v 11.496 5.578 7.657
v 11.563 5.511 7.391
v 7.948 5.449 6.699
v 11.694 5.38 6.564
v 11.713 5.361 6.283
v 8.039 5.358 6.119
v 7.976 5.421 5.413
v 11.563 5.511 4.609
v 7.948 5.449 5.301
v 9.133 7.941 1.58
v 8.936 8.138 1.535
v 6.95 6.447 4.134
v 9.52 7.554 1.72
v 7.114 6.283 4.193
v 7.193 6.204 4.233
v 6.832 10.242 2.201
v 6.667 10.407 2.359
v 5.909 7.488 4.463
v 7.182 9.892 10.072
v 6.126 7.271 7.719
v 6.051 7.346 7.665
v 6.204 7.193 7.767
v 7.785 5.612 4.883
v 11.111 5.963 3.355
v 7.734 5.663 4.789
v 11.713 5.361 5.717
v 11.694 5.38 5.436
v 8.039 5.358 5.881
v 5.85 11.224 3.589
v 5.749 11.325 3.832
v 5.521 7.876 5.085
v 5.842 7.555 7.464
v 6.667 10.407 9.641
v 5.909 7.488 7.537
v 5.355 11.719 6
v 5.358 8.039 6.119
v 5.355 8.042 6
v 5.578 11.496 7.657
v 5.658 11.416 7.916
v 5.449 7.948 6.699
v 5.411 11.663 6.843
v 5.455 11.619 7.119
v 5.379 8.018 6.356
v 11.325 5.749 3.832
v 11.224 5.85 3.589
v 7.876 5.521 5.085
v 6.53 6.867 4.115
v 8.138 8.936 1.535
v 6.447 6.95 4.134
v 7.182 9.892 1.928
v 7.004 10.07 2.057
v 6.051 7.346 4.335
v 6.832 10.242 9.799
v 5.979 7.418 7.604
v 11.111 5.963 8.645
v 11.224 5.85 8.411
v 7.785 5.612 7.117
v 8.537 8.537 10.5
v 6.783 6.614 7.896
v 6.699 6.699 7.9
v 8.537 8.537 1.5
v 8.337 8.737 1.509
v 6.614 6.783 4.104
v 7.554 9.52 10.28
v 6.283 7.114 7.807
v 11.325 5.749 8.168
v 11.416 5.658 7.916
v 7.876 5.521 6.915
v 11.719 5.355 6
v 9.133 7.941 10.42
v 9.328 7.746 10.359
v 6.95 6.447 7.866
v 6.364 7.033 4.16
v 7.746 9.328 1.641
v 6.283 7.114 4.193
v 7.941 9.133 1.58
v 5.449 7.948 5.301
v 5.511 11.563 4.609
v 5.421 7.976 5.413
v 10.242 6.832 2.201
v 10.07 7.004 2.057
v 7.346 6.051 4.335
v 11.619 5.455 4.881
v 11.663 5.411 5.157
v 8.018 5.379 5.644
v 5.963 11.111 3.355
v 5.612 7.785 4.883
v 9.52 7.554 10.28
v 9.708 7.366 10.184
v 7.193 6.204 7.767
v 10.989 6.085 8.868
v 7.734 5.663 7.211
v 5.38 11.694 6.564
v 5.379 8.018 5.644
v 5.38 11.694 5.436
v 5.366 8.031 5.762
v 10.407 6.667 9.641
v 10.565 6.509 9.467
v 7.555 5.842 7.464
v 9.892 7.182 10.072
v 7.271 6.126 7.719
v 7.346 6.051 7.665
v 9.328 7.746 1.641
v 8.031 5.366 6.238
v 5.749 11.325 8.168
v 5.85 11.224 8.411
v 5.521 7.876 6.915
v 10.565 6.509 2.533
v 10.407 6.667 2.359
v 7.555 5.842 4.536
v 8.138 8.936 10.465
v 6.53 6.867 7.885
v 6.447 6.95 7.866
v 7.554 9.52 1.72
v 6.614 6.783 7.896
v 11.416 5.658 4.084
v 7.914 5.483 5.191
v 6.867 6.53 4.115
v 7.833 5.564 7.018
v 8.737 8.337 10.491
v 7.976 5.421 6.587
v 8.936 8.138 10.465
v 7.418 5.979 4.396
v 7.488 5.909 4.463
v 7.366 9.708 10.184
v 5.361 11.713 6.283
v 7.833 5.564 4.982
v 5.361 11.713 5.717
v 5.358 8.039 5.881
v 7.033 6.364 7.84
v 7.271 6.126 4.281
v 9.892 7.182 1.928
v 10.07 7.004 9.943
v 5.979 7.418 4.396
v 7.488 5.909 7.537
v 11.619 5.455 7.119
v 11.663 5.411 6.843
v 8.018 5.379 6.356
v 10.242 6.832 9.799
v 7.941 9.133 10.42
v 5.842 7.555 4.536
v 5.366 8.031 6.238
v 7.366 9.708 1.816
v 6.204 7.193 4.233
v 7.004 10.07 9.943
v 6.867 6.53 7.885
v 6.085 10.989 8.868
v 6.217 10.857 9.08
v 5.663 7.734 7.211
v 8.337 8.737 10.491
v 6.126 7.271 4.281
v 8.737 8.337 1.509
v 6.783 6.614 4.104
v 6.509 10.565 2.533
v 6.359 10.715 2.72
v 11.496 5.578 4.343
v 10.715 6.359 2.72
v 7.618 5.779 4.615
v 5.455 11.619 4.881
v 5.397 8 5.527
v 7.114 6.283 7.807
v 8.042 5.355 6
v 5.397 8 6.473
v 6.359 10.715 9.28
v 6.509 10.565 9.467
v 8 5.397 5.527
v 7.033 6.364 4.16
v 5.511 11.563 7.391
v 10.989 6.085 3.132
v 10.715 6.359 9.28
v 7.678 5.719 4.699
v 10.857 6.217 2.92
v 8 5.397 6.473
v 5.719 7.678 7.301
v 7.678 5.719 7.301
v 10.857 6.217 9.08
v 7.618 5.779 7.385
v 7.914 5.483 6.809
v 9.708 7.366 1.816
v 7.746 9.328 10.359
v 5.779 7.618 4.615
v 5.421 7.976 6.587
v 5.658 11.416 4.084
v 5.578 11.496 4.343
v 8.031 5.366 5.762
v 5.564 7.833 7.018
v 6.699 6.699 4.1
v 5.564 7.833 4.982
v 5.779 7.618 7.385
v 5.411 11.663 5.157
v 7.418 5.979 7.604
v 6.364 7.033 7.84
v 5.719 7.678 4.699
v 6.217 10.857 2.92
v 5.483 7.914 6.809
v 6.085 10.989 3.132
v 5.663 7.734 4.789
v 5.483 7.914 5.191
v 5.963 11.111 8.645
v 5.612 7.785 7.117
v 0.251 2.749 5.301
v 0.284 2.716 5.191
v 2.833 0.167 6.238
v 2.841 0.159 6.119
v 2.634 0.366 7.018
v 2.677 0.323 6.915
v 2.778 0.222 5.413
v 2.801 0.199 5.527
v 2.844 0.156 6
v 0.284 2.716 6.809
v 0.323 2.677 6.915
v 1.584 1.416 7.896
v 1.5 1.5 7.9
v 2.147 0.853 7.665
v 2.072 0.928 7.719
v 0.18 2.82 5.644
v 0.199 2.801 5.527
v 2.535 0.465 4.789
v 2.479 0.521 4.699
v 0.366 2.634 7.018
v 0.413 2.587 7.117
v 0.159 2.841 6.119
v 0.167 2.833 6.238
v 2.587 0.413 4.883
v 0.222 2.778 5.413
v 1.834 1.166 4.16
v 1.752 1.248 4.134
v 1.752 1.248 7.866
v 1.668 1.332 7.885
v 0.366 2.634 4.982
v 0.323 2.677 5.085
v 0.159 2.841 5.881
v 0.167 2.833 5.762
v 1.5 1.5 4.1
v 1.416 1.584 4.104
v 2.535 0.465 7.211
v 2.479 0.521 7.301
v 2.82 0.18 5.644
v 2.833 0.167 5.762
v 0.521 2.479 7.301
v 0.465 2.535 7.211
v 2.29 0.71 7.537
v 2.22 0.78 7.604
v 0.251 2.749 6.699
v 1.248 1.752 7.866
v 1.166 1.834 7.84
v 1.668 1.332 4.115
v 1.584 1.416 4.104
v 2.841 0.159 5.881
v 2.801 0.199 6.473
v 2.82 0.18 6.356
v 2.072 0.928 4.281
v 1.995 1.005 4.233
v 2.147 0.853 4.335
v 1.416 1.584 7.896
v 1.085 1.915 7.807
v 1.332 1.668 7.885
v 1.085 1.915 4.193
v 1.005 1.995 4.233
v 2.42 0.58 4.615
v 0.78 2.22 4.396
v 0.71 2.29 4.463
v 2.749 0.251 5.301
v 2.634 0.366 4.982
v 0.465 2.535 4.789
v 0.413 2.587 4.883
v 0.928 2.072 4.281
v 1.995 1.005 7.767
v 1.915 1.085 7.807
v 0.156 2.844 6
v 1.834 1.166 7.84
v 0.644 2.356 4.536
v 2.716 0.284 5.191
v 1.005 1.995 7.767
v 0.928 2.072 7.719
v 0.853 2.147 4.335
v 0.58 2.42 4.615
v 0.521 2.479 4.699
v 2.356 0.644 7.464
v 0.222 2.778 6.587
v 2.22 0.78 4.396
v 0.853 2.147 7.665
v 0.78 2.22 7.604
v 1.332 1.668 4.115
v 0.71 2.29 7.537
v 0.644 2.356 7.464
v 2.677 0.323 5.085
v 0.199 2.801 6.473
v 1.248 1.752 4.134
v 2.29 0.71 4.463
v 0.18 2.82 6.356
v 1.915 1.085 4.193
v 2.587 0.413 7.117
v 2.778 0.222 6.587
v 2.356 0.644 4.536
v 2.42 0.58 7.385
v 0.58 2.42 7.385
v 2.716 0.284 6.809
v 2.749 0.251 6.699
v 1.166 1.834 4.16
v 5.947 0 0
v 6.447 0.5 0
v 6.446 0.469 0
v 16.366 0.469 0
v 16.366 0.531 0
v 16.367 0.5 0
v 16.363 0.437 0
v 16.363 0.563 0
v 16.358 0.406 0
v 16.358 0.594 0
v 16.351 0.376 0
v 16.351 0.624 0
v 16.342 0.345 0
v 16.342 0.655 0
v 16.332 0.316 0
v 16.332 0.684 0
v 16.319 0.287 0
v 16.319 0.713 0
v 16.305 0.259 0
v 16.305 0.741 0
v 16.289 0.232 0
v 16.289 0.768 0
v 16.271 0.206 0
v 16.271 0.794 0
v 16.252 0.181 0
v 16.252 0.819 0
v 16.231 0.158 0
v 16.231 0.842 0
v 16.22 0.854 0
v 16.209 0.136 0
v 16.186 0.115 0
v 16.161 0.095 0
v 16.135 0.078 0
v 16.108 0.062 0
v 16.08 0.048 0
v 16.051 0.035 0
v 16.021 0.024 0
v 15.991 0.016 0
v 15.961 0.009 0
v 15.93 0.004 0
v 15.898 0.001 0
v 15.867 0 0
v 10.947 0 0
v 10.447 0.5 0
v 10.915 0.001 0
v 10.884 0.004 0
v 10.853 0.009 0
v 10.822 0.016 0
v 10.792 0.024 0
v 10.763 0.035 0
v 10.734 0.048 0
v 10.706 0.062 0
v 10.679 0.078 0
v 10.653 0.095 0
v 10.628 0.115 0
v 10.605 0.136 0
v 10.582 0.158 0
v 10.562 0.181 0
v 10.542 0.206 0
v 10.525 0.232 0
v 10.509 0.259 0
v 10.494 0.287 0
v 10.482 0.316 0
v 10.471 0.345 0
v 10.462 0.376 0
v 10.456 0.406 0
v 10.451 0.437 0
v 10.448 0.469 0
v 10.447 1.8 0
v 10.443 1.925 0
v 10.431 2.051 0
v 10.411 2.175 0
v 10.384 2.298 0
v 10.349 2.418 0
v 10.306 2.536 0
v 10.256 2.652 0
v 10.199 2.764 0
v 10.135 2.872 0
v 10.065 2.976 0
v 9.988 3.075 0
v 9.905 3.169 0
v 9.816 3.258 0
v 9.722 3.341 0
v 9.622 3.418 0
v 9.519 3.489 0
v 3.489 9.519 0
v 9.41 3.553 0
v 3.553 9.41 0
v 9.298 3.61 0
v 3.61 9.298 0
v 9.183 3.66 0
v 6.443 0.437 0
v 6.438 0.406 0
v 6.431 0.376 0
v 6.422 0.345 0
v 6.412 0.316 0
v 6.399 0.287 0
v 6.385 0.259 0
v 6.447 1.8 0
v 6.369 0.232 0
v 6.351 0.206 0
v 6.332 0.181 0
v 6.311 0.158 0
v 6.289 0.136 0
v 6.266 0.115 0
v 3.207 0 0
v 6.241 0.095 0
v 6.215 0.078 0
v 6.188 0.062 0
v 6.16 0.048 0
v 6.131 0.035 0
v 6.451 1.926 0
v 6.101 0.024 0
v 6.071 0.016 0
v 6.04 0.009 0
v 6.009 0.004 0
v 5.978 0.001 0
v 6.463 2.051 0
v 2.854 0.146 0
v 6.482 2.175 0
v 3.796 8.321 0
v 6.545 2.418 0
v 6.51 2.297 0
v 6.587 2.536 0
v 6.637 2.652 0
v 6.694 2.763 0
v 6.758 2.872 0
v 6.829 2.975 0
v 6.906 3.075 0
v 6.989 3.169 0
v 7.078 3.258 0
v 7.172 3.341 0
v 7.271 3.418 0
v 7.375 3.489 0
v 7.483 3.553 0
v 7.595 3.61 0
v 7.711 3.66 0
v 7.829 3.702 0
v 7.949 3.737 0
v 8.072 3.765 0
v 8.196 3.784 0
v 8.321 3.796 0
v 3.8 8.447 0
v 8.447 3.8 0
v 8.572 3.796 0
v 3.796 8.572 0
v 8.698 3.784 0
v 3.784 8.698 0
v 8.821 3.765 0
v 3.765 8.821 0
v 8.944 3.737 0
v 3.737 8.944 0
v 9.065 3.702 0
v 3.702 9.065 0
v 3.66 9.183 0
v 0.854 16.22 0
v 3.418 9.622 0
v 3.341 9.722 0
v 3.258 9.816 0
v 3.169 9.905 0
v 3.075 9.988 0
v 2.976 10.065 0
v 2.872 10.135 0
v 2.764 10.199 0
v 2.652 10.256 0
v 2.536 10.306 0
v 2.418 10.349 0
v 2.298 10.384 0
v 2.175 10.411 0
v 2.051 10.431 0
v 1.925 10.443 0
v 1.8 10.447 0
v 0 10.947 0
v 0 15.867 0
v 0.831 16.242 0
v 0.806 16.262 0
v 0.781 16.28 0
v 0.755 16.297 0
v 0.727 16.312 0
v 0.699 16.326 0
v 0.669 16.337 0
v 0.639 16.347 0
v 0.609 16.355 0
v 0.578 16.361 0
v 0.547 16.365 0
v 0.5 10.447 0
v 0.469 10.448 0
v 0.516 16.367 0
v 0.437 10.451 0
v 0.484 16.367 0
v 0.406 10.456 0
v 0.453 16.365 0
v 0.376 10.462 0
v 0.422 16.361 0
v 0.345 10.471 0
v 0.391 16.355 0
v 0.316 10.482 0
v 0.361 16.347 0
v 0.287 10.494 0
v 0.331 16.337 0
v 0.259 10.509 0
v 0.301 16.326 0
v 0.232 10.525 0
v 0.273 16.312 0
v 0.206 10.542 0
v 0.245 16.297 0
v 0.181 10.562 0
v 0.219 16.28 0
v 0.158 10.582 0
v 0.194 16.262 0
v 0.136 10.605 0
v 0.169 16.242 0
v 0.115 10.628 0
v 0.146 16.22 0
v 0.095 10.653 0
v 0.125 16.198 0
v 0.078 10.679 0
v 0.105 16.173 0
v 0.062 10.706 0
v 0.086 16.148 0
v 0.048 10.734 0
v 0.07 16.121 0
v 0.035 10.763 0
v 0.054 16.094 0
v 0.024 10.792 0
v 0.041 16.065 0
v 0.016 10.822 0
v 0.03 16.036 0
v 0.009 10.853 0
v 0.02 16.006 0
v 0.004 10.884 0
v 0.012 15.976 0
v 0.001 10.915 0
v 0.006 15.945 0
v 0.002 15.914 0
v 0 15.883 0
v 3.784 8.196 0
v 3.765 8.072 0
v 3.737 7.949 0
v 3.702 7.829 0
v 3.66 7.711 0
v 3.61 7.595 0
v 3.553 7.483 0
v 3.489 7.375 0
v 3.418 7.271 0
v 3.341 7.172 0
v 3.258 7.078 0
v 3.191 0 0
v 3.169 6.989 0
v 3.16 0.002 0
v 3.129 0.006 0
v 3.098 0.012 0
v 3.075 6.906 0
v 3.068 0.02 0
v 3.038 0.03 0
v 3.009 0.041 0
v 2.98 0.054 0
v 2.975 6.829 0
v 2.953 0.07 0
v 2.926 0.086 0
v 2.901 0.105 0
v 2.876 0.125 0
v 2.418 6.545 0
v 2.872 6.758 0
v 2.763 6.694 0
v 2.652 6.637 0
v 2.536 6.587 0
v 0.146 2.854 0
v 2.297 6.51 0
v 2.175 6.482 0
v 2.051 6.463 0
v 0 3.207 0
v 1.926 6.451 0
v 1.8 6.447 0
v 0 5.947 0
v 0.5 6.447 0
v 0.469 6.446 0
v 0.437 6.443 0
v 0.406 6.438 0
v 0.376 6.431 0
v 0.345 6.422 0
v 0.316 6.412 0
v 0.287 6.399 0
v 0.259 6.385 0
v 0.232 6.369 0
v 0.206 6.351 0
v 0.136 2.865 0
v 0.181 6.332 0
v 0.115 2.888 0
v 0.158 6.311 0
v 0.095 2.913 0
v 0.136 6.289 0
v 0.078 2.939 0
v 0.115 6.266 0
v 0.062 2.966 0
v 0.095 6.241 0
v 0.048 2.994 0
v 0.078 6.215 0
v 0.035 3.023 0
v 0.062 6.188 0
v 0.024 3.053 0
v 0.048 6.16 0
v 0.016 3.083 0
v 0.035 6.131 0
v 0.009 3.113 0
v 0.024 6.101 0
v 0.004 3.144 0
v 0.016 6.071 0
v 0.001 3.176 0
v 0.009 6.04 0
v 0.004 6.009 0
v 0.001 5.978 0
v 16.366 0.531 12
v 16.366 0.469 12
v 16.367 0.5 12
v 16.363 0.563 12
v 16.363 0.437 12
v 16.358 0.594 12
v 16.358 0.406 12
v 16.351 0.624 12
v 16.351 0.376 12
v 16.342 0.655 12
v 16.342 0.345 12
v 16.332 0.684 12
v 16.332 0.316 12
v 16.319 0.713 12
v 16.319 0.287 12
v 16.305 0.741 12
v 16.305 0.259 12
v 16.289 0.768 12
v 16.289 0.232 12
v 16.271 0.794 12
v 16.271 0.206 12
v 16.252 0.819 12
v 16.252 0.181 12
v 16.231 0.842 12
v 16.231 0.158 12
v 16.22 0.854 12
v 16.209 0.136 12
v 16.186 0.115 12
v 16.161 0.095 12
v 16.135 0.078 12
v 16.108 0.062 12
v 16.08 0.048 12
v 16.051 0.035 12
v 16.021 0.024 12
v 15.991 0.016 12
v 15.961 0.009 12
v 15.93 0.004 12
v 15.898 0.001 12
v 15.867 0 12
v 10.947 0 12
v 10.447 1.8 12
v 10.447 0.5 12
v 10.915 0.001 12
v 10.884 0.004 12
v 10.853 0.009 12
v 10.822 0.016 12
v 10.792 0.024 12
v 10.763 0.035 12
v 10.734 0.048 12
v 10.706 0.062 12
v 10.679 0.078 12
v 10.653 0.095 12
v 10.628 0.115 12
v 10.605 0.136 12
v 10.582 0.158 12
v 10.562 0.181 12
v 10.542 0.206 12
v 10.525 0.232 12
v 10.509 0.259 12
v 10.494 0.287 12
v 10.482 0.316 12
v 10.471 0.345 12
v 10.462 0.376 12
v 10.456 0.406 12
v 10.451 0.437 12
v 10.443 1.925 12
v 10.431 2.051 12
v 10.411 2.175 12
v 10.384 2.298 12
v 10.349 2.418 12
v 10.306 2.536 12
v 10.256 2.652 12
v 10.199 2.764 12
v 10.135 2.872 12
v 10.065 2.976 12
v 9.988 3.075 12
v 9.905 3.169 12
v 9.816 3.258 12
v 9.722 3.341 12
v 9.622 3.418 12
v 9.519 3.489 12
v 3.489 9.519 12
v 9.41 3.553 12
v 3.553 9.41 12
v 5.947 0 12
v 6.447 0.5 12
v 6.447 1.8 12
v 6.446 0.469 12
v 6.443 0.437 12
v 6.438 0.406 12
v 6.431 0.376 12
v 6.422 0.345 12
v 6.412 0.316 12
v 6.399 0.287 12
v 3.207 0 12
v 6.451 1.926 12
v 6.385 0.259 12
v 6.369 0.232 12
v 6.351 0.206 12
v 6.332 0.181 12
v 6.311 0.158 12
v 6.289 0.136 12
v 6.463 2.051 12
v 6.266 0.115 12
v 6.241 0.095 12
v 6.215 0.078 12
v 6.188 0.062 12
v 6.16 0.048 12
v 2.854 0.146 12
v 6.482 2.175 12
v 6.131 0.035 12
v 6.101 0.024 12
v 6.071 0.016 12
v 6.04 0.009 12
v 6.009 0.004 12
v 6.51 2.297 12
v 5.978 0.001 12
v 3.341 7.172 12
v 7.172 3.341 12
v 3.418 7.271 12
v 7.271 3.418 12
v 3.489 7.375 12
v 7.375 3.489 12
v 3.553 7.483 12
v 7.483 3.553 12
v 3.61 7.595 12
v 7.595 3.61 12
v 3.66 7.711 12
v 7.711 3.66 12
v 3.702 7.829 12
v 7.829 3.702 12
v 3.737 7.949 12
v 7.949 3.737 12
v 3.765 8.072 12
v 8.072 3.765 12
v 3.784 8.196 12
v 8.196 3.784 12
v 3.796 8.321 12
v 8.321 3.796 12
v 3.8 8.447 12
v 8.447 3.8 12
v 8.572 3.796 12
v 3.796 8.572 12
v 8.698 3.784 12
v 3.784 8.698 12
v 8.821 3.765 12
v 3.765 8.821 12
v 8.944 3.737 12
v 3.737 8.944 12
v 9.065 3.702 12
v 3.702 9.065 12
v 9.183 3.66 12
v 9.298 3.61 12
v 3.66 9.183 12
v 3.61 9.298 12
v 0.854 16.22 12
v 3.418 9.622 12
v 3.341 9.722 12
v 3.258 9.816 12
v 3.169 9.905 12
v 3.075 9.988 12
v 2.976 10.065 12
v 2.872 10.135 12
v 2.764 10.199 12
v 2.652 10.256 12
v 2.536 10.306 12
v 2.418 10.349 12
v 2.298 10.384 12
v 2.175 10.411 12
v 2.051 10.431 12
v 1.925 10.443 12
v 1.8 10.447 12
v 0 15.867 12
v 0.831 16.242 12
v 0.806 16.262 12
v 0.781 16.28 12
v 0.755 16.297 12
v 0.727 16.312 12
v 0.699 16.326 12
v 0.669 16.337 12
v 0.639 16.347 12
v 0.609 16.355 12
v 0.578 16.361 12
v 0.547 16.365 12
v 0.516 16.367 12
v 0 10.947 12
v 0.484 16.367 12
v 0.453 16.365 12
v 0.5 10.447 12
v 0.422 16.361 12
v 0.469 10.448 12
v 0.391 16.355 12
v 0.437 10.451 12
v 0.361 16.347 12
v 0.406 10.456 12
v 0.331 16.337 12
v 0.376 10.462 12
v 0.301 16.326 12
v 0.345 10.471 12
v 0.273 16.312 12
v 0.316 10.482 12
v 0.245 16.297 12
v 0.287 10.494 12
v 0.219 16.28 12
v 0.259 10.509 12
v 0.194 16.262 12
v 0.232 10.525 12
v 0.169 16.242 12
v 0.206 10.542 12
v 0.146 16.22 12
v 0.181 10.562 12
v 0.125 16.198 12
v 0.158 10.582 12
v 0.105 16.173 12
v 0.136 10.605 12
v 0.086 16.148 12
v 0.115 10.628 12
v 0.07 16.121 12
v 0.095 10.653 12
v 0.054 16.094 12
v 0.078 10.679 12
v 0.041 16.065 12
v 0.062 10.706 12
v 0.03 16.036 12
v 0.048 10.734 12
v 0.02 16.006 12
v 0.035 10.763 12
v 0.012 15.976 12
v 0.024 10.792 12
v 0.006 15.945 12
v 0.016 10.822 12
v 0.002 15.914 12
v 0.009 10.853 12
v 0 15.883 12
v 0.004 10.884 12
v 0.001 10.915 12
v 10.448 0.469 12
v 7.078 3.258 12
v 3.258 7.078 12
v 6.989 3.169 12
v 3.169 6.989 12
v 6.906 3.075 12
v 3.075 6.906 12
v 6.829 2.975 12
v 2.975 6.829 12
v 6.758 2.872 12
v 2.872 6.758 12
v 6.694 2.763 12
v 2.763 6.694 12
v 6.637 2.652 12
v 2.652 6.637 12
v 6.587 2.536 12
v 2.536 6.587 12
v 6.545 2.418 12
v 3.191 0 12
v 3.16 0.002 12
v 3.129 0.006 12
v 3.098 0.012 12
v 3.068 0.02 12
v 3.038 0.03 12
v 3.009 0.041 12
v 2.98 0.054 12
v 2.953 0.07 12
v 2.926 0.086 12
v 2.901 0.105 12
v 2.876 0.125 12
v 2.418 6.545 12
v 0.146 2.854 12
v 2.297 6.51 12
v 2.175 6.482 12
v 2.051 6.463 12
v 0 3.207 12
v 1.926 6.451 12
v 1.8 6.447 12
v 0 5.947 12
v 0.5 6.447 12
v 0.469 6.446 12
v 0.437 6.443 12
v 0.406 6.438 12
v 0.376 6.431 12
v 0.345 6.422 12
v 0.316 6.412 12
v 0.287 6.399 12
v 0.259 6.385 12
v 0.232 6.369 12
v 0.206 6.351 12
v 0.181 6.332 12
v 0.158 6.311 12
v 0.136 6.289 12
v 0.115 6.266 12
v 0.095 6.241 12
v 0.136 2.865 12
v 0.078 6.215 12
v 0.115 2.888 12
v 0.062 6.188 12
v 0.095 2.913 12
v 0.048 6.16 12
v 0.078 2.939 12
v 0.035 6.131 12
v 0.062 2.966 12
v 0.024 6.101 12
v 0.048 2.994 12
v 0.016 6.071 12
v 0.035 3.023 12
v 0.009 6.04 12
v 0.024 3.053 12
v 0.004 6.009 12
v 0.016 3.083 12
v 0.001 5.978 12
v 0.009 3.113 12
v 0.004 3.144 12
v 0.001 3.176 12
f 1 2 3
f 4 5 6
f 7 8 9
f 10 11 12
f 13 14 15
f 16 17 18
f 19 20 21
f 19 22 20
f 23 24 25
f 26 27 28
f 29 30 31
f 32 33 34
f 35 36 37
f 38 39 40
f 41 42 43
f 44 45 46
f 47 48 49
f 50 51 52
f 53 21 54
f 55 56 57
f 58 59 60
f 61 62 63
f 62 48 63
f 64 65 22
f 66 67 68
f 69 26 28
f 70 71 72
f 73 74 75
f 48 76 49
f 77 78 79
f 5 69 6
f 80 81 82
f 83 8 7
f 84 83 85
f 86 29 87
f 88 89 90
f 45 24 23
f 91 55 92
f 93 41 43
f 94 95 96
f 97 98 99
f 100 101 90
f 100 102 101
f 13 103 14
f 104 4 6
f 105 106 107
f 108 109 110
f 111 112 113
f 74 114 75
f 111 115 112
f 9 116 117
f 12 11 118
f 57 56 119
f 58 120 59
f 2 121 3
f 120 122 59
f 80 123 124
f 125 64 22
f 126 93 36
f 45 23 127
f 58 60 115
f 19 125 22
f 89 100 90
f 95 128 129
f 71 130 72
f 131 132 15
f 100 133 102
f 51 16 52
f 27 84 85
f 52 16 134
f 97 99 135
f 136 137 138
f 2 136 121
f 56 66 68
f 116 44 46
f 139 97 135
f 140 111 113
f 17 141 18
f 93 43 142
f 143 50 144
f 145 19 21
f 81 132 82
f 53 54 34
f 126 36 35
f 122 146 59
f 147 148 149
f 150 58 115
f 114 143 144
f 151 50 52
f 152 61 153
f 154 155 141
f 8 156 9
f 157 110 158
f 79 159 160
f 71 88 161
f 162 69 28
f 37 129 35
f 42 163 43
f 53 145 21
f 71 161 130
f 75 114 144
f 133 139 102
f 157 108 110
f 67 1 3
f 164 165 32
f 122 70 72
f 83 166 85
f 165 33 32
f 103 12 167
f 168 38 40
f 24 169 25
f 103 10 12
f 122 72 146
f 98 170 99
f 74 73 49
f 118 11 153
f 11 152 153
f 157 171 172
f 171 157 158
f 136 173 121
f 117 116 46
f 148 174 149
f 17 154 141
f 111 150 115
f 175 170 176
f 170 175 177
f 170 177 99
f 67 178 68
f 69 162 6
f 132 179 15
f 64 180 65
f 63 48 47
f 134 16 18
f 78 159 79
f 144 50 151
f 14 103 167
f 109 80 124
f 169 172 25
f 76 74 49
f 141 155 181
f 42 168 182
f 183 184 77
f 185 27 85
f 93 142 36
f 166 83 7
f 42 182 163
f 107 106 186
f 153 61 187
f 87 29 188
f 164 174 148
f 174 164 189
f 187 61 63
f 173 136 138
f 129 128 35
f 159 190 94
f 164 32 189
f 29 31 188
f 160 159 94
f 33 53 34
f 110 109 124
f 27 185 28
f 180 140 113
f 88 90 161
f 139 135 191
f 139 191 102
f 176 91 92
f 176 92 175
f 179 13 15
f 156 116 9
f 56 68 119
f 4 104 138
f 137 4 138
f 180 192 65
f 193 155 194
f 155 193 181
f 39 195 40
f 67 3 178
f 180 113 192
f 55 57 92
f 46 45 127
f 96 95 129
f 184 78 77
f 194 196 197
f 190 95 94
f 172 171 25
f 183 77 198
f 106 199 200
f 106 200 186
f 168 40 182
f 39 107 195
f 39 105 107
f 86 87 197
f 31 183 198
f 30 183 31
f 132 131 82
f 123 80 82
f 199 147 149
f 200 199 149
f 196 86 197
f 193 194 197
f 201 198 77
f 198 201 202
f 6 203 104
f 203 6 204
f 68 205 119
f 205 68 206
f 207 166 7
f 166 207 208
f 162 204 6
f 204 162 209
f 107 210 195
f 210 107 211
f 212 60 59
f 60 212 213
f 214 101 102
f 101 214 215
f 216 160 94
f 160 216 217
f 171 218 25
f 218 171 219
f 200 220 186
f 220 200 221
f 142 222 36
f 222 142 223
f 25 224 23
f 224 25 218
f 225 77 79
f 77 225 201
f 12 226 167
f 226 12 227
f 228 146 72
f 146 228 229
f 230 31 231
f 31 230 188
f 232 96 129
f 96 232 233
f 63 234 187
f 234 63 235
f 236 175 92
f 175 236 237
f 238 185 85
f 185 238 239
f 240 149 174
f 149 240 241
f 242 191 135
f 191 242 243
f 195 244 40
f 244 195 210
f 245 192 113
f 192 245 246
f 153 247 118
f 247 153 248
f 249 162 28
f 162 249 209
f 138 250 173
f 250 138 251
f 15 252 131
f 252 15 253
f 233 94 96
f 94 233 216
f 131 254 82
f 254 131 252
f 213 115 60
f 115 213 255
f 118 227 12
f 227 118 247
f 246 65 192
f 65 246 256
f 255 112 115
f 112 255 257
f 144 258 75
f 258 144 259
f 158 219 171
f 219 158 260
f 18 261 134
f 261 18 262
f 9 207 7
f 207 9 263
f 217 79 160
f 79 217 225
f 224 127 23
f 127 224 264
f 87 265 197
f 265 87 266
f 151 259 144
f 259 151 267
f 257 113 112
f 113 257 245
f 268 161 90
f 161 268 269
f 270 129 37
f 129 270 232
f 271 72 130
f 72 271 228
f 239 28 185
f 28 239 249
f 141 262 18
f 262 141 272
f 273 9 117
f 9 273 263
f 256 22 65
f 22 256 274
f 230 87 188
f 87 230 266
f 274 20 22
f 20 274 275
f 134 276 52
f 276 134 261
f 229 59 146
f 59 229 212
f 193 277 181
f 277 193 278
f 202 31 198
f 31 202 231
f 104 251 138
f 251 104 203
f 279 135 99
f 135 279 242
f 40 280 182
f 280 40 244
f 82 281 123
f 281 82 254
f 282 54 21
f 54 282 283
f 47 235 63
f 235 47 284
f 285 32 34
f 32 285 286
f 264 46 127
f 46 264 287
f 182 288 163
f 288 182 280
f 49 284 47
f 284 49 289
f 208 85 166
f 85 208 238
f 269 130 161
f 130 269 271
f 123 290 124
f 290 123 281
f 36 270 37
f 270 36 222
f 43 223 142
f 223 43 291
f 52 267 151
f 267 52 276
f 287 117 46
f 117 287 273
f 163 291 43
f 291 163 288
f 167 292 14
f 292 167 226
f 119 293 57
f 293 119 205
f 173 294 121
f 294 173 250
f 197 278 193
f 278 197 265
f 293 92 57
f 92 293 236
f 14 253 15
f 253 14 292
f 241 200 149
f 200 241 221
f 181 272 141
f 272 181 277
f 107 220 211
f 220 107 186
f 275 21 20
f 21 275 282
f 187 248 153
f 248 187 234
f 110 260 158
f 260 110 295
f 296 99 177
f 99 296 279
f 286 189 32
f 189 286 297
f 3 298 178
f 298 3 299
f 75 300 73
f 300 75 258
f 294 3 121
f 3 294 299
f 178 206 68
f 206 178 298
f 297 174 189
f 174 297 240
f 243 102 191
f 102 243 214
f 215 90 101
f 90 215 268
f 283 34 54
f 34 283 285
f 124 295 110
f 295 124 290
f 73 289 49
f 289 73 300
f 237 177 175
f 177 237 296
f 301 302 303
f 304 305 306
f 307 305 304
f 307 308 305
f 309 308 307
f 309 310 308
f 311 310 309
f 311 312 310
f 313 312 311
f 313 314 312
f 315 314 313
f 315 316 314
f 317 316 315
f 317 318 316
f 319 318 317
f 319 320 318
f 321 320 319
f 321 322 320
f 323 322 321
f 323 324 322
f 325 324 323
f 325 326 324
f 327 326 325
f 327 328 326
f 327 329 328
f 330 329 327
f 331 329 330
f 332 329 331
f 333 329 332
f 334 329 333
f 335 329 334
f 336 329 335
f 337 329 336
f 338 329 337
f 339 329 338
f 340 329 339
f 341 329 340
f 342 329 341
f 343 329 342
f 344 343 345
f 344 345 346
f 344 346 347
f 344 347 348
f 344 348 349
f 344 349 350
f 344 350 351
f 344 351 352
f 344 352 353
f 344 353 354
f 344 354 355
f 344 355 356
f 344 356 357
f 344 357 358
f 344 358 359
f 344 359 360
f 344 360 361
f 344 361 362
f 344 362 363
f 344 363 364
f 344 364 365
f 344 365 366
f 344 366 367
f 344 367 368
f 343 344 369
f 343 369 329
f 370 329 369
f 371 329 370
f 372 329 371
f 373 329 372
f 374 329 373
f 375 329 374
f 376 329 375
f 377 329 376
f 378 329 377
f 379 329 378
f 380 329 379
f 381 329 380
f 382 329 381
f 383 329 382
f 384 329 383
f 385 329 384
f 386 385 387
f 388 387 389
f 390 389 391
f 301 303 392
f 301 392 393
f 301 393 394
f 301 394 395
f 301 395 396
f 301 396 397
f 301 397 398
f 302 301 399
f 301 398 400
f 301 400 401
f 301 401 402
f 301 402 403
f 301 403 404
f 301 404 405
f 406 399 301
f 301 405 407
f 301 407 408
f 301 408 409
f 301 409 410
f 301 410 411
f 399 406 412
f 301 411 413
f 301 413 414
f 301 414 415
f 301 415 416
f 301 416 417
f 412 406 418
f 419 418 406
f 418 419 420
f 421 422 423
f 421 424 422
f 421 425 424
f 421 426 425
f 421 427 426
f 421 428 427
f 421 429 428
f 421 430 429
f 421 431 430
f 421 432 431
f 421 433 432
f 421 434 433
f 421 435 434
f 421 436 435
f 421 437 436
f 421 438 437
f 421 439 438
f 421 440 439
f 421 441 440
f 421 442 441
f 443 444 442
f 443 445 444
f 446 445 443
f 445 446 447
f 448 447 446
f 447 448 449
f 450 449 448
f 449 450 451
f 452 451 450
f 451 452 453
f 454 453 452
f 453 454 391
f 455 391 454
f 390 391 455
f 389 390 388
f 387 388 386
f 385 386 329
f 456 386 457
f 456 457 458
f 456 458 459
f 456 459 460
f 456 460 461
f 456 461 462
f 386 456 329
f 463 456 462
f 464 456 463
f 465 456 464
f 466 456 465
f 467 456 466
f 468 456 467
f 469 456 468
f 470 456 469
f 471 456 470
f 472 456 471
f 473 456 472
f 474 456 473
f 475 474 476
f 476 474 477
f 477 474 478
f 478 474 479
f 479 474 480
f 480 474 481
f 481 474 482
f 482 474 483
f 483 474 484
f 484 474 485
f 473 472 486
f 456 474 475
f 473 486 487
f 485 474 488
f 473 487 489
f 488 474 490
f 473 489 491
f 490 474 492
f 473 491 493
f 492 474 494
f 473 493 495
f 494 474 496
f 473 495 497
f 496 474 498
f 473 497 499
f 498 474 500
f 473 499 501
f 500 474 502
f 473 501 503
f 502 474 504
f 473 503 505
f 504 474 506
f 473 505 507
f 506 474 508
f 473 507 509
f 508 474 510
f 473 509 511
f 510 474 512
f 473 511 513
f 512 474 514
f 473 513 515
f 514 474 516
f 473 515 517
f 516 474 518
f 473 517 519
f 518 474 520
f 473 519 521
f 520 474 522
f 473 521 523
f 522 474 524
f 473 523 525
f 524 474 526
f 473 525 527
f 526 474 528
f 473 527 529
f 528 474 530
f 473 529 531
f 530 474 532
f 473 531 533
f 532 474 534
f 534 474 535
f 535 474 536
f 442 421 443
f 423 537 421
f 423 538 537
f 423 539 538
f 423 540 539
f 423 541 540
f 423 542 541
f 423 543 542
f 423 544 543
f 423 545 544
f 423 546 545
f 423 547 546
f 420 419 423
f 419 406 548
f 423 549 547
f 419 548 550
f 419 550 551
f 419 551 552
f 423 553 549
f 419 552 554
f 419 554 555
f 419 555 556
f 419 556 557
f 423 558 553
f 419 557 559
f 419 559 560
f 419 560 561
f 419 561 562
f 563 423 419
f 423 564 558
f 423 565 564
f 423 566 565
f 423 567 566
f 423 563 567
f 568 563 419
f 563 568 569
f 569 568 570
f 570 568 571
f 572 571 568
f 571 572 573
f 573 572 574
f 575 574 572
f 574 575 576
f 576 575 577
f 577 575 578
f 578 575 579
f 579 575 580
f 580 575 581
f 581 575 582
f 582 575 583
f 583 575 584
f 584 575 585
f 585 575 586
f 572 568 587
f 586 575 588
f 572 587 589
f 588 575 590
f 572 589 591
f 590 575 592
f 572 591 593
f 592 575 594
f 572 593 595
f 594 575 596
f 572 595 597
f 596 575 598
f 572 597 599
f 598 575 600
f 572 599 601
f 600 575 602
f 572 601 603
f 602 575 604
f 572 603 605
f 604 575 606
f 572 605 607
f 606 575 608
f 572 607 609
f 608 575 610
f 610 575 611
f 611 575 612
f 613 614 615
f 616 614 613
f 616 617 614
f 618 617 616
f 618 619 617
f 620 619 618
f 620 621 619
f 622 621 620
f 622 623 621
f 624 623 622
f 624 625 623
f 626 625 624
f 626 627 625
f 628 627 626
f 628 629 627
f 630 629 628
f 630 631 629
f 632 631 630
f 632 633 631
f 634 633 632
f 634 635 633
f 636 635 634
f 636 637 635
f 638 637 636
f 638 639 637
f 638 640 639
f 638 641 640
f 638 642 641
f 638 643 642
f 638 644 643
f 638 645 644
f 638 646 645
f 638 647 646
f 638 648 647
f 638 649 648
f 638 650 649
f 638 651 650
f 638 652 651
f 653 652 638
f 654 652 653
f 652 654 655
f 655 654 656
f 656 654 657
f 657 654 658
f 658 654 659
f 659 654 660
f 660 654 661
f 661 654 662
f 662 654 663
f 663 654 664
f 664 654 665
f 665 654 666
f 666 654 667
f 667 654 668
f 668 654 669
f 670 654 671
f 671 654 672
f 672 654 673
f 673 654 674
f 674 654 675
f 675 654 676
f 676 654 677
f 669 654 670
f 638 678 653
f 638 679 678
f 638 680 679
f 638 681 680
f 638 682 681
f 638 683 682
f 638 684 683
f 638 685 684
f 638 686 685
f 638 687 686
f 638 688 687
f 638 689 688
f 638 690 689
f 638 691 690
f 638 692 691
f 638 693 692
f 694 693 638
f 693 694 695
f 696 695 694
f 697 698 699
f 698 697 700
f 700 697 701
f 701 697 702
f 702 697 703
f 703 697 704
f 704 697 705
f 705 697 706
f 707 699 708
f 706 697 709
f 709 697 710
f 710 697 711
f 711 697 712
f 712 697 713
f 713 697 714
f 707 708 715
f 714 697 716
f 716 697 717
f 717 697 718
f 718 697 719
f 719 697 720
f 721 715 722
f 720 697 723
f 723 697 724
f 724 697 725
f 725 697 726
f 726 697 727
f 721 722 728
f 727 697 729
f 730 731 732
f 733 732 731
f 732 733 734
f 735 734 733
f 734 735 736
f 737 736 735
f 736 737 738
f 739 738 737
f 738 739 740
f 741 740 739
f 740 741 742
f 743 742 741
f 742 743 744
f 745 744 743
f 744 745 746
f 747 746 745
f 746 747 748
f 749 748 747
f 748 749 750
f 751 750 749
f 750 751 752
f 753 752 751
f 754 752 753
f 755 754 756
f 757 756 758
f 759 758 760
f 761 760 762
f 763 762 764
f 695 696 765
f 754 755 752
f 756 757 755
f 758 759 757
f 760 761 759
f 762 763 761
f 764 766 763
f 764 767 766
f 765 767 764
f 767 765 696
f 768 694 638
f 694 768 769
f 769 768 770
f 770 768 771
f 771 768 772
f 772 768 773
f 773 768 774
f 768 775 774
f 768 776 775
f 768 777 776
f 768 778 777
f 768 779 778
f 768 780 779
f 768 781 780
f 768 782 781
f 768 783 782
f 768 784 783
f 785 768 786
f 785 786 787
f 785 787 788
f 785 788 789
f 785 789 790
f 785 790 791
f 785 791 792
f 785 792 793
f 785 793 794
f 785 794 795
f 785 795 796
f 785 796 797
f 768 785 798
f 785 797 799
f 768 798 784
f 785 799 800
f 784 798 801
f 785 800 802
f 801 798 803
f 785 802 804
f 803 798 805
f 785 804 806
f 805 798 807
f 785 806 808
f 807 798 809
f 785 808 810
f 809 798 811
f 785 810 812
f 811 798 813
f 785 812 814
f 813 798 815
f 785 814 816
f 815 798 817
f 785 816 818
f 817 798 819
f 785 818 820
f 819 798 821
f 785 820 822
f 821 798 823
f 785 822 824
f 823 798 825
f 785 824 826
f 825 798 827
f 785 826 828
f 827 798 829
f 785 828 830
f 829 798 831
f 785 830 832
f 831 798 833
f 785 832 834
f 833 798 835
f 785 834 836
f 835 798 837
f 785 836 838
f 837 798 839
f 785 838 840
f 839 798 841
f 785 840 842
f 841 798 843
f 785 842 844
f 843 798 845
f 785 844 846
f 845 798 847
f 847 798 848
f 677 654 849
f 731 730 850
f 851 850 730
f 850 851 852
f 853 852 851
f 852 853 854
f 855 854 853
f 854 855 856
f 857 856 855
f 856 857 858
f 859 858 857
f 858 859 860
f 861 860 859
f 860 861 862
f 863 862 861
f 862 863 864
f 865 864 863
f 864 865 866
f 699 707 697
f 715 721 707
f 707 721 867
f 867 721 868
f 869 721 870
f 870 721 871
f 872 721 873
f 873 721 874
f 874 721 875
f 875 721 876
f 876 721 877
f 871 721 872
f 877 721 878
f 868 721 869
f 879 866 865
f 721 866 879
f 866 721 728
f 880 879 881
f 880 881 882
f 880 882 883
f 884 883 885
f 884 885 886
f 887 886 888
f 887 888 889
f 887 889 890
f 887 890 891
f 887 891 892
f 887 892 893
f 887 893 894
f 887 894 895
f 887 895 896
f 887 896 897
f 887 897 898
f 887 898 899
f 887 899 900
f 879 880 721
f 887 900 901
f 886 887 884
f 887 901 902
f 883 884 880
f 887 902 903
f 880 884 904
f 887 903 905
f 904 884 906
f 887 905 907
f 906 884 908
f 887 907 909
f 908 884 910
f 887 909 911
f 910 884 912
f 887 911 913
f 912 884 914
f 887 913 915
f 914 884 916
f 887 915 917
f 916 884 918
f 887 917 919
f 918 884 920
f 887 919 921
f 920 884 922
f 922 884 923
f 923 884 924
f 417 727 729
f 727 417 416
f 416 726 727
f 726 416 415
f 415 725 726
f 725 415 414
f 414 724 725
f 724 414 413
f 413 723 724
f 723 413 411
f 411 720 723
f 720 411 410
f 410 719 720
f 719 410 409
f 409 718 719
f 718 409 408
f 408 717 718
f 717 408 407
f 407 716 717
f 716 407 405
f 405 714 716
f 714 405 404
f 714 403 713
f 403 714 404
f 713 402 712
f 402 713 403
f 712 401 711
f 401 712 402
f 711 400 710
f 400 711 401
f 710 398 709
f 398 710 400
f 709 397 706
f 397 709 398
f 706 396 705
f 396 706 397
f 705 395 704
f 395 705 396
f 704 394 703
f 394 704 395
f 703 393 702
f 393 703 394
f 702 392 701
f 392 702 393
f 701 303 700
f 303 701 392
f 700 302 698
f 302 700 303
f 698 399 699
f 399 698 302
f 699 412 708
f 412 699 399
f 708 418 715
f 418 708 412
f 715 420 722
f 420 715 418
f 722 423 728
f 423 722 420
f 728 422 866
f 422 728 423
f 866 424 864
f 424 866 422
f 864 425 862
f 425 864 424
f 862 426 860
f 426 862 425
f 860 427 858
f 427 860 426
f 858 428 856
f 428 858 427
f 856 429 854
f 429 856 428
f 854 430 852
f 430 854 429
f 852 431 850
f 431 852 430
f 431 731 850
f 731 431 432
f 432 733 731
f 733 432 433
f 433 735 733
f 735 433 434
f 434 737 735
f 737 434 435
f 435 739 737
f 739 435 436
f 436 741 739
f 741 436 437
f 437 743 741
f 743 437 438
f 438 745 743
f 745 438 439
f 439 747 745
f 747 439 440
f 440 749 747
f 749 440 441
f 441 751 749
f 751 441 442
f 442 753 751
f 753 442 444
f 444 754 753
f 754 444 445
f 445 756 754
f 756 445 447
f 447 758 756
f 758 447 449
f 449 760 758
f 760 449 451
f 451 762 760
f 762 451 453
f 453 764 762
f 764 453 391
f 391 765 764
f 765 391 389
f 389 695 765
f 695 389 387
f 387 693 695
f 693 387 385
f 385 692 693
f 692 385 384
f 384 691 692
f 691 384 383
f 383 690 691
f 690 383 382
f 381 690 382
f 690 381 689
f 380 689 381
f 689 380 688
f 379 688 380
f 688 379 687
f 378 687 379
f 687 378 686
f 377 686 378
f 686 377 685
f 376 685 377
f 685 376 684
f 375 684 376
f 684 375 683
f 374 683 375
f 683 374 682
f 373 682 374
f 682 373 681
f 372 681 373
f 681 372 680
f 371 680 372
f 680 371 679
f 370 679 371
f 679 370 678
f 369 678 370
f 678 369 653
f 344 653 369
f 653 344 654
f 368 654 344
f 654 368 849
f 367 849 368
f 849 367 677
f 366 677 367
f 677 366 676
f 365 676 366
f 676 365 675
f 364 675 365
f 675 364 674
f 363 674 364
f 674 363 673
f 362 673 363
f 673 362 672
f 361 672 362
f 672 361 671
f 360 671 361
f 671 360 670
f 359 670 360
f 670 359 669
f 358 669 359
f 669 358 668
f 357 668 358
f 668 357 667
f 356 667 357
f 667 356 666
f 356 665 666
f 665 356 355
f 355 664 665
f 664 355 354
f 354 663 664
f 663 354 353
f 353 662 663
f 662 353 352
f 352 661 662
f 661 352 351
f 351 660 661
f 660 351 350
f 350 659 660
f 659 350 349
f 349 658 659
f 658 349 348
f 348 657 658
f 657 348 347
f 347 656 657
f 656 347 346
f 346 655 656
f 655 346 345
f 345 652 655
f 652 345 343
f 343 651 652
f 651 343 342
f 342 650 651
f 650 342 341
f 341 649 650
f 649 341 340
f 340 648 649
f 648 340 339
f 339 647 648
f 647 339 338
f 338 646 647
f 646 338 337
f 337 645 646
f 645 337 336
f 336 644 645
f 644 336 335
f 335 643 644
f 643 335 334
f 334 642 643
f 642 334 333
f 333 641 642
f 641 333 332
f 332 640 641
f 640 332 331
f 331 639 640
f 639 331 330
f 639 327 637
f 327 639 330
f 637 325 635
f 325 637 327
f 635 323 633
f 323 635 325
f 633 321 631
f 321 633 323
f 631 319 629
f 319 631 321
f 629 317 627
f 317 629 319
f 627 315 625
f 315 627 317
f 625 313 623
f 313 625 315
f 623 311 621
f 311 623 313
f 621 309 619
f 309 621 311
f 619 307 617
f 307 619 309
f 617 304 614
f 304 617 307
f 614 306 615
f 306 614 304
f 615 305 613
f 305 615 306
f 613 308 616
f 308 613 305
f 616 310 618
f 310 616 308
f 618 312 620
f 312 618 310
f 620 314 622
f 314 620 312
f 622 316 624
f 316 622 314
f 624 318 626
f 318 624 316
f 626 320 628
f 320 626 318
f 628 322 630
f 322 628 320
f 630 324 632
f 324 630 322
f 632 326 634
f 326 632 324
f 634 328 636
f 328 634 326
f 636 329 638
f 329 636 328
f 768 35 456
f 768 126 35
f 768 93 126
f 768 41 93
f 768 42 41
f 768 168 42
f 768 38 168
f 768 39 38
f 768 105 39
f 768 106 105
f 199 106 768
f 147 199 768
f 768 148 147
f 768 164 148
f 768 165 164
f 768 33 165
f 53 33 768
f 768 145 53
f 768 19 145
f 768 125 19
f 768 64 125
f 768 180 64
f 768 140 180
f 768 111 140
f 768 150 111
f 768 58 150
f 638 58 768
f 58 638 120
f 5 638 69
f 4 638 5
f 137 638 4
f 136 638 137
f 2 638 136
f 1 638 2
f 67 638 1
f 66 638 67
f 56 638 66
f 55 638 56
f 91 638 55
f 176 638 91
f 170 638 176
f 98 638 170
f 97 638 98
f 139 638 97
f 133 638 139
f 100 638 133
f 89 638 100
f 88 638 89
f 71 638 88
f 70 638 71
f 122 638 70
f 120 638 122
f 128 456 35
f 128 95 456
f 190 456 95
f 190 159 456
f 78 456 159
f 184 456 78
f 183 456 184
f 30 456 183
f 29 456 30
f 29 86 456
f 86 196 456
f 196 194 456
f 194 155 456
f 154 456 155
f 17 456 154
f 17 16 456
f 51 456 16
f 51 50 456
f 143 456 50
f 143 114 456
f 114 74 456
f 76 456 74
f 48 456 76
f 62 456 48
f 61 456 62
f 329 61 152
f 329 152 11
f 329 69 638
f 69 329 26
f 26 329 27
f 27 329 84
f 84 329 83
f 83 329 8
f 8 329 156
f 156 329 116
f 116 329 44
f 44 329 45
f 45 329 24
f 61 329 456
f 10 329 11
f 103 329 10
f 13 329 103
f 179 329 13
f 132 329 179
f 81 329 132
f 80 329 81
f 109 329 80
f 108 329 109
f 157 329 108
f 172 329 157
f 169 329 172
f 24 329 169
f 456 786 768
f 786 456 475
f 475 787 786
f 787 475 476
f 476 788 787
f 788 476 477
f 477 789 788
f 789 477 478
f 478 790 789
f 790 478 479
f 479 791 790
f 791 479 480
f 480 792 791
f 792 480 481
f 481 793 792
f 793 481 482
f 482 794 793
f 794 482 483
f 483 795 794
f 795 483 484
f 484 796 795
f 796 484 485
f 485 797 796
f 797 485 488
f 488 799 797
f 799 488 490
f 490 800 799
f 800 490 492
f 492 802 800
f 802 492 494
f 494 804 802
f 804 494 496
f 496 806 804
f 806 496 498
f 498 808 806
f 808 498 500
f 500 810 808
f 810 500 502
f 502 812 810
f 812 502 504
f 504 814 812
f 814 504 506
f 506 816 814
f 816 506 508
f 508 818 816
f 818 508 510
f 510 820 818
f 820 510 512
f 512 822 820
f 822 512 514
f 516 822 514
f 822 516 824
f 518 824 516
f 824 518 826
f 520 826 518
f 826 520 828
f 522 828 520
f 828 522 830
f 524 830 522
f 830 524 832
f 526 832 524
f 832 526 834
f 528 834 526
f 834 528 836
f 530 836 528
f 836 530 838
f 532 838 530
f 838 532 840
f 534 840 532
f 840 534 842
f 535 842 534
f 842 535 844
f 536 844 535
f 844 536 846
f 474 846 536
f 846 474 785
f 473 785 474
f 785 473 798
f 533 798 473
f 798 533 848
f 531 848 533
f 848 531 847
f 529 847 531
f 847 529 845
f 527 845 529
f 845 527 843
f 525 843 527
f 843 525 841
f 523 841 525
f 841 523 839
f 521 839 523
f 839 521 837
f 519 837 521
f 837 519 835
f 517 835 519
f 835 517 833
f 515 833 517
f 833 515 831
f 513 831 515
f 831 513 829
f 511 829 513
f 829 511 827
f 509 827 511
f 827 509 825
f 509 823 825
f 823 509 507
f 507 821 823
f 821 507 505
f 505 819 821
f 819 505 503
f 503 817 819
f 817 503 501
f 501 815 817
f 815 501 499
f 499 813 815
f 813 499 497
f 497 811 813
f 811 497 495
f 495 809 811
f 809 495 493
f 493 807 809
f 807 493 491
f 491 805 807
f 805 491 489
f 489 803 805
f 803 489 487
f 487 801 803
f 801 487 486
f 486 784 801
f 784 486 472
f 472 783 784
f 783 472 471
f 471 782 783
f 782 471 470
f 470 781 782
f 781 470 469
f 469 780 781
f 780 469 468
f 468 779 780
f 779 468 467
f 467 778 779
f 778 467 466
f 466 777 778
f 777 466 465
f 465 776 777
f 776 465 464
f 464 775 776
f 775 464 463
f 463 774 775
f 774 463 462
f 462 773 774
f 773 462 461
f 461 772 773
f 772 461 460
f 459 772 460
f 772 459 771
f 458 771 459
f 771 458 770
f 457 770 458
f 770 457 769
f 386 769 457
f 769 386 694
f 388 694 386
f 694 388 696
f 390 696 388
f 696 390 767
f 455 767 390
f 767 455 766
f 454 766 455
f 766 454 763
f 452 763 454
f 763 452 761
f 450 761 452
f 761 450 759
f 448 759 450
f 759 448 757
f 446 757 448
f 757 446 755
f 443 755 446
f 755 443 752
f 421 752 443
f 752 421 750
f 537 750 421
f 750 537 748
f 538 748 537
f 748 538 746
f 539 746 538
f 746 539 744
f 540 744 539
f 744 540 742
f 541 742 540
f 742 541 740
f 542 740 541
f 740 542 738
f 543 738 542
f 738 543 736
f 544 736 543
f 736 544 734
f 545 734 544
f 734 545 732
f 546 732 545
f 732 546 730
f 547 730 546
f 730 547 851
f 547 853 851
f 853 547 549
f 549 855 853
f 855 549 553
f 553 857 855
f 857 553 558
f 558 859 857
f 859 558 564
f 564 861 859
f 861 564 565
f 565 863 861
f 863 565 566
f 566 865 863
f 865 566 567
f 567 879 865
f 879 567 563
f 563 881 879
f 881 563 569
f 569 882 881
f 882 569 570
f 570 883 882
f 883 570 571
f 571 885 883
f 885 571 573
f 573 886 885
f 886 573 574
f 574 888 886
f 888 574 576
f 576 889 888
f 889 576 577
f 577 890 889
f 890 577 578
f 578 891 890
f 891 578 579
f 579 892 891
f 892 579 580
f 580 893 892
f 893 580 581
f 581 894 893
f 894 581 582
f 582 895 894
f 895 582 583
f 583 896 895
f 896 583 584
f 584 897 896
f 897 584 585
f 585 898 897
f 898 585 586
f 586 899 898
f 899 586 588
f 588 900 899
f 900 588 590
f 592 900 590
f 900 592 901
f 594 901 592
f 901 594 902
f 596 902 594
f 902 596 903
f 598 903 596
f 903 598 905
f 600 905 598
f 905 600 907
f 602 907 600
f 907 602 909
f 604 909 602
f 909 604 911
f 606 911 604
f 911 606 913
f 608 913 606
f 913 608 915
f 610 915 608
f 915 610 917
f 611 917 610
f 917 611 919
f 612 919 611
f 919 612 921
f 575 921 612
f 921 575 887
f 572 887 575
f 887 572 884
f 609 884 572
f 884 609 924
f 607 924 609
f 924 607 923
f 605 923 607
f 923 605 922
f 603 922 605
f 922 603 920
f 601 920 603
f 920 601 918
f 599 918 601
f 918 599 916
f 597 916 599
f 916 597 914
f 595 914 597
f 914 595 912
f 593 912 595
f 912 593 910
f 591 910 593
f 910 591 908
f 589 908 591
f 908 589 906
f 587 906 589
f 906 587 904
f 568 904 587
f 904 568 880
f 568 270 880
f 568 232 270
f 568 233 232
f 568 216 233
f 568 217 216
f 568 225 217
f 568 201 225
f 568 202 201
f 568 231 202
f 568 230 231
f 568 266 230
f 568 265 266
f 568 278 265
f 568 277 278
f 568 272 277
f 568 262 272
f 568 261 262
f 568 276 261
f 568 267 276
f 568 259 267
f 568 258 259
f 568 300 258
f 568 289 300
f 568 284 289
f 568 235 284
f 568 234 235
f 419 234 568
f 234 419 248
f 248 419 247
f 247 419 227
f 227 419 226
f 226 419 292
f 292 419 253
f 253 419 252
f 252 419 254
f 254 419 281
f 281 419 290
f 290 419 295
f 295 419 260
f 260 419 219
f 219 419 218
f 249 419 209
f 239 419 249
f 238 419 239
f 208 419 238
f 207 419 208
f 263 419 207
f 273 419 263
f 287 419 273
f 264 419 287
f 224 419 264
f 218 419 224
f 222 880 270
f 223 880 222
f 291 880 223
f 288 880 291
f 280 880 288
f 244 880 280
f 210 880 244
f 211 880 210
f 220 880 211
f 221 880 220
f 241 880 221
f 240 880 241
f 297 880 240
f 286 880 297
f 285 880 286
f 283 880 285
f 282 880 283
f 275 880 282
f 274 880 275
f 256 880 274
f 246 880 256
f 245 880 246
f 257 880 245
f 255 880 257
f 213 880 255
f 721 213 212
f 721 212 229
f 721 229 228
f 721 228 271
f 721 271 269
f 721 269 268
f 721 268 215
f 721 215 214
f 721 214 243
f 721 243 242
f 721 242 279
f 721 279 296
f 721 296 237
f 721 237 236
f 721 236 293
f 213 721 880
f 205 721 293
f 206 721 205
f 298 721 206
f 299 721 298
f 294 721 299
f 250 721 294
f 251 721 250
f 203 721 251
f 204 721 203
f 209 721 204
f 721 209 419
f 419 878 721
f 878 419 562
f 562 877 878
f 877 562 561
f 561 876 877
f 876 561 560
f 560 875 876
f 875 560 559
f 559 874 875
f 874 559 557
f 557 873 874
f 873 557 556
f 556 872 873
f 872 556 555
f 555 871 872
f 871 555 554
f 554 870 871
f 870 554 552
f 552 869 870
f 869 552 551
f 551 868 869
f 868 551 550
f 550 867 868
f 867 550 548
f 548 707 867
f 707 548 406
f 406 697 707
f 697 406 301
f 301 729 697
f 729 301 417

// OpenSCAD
rounding = 0.5;
thickness = 16.0;
corner_distance = 3.0;
$fn = $preview ? 20 : 100;
screw_radius = 1.90;
screw_hat_radius = 4.5;
screw_hat_angle = 45;
height = 12.0;
left_cable_radius = 2.0;
right_cable_radius = 2.0;
left_cable_tightening = 0.2;
right_cable_tightening = 0.2;
screw_margin = 0.8;
wall_thickness = 2.0;
corner = true;

function thickness() = corner ?
    sqrt(pow(max(right_cable_radius * 2 - right_cable_tightening, left_cable_radius * 2 - left_cable_tightening) + sqrt(pow(screw_hat_radius*2, 2)/2) + sqrt(pow(screw_radius + screw_margin, 2)/2), 2)*2)
    : max(right_cable_radius * 2 - right_cable_tightening, left_cable_radius * 2 - left_cable_tightening) + wall_thickness;

module outer() {
    if (corner) {
        polygon([
        [corner_distance, 0],
        [thickness(), 0],
        [0, thickness()],
        [0, corner_distance]
        ]);
    } else {
        width = screw_radius * 2 + screw_margin * 2 + left_cable_radius * 2 + right_cable_radius * 2 + wall_thickness;
        outer_radius = right_cable_radius + wall_thickness;
        bounds = [
            [0, 0],
            [0, thickness()],
            [width - outer_radius, thickness()],
            [width, thickness()],
            [width, thickness() - outer_radius],
            [width, 0],
            ];
        union() {
            polygon(bounds, [[0, 1, 2, 4, 5]]);
            intersection() {
                polygon(bounds, [[0, 1, 3, 5]]);
                translate([width - outer_radius, thickness() - outer_radius, 0]) circle(outer_radius);
            }
        }
    }
}

module flat_cutout(radius, tighten) {
    union() {
        polygon([
            [-radius, -0],
            [-radius, radius - tighten],
            [radius, radius - tighten],
            [radius, 0],
        ]);
        translate([0, radius - tighten, 0]) circle(radius);
    }
}

module corner_cable_cutout(radius, tighten, t_x, t_y) {
    assert(t_x * t_y == 0 && t_x + t_y == 1, "t_x and t_y must be one of (1, 0) or (0, 1)");
    screw_offset = sqrt(pow(screw_radius + screw_margin, 2)*2);
    tight_radius = radius - tighten;
    required_height = tight_radius + sqrt(pow(radius, 2)*2);
    distance = required_height + screw_offset;
    polygon([
        [t_x * (distance - radius), t_y * (distance - radius)],
        [t_x * (distance - radius) + t_y * tight_radius, t_y * (distance - radius) + t_x * tight_radius],
        [t_x * (distance + radius) + t_y * tight_radius, t_y * (distance + radius) + t_x * tight_radius],
        [t_x * (distance + radius), t_y * (distance + radius)],
    ]);
    translate([t_x * distance + t_y * tight_radius, t_y * distance + t_x * tight_radius, 0]) circle(radius);
}

module screw() {
    screw_scale = screw_radius/screw_hat_radius;
    screw_angled_height = tan(screw_hat_angle)*(screw_hat_radius-screw_radius);
    linear_extrude(screw_angled_height, scale = screw_scale) circle(r = screw_hat_radius);
    translate([0, 0, screw_angled_height]) linear_extrude(thickness()) circle(r = screw_radius);
}

module merged() {
    difference() {
        linear_extrude(height) offset(r = rounding) offset(delta = -rounding) difference() {
           outer();
            if (corner) {
                corner_cable_cutout(left_cable_radius, left_cable_tightening, 1, 0);
                corner_cable_cutout(right_cable_radius, right_cable_tightening, 0, 1);
            } else {
                translate([left_cable_radius, 0, 0]) {
                    flat_cutout(left_cable_radius, left_cable_tightening);
                    translate([screw_radius * 2 + screw_margin * 2 + left_cable_radius + right_cable_radius, 0, 0]) flat_cutout(right_cable_radius, right_cable_tightening);
                }
            }
        }
        if (corner) {
            translate([thickness()/2, thickness()/2, height / 2]) rotate([90, 0, -45]) screw();
        } else {
            translate([left_cable_radius * 2 + screw_margin + screw_radius, thickness(), height / 2]) rotate([90, 0, 0]) screw();
        }
    }
}

//screw();

merged();
//flat_cutout(left_cable_radius, left_cable_tightening);
//outer();
